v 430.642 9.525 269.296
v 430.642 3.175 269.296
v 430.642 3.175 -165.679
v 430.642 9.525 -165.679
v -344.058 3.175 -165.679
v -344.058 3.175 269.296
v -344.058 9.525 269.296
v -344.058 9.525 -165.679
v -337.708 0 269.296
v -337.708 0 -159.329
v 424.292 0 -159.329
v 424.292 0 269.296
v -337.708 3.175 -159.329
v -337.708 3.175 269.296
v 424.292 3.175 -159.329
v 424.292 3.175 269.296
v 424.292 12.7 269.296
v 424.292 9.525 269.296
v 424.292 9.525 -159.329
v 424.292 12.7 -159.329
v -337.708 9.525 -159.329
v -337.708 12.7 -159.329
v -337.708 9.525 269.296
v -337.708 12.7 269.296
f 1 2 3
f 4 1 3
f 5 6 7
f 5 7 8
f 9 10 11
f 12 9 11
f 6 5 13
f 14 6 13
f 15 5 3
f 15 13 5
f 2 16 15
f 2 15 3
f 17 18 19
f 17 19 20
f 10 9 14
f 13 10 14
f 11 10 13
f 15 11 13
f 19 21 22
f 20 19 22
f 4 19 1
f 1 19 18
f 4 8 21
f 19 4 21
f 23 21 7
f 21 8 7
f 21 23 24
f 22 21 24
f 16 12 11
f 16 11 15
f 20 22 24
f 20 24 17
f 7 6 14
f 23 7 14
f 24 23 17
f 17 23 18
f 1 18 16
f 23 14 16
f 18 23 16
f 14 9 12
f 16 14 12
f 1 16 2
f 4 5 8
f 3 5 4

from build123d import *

# Parameters (mm, degrees)
SKETCH1_W           = 774.7
SKETCH1_H           = 434.975
BOSS_EXTRUDE1_DEPTH = 12.7
SKETCH2_W           = 6.35
SKETCH2_H           = 3.175
CUT_EXTRUDE1_DEPTH  = 775.7
SKETCH3_W           = 6.35
SKETCH3_H           = 3.175
CUT_EXTRUDE2_DEPTH  = 435.975


with BuildPart() as part:
    # Sketch1 → Boss-Extrude1 (new body)
    with BuildSketch(Plane(origin=(0, 0, 0), x_dir=(1, 0, 0), z_dir=(0, 1, 0))):
        with Locations((43.291693811, -51.808346906)):
            Rectangle(SKETCH1_W, SKETCH1_H)
    extrude(amount=BOSS_EXTRUDE1_DEPTH)

    # Sketch2 → Cut-Extrude1 (cut, through all)
    with BuildSketch(Plane.ZY.offset(344.058306189)):
        with Locations((-162.504153094, 11.1125)):
            Rectangle(SKETCH2_W, SKETCH2_H)
        with Locations((-162.504153094, 1.5875)):
            Rectangle(SKETCH2_W, SKETCH2_H)
    extrude(amount=-CUT_EXTRUDE1_DEPTH, mode=Mode.SUBTRACT)

    # Sketch3 → Cut-Extrude2 (cut, through all)
    with BuildSketch(Plane.XY.offset(269.295846906)):
        with Locations((-340.883306189, 11.1125)):
            Rectangle(SKETCH3_W, SKETCH3_H)
        with Locations((-340.883306189, 1.5875)):
            Rectangle(SKETCH3_W, SKETCH3_H)
        with Locations((427.466693811, 1.5875)):
            Rectangle(SKETCH3_W, SKETCH3_H)
        with Locations((427.466693811, 11.1125)):
            Rectangle(SKETCH3_W, SKETCH3_H)
    extrude(amount=-CUT_EXTRUDE2_DEPTH, mode=Mode.SUBTRACT)


solid = part.part
